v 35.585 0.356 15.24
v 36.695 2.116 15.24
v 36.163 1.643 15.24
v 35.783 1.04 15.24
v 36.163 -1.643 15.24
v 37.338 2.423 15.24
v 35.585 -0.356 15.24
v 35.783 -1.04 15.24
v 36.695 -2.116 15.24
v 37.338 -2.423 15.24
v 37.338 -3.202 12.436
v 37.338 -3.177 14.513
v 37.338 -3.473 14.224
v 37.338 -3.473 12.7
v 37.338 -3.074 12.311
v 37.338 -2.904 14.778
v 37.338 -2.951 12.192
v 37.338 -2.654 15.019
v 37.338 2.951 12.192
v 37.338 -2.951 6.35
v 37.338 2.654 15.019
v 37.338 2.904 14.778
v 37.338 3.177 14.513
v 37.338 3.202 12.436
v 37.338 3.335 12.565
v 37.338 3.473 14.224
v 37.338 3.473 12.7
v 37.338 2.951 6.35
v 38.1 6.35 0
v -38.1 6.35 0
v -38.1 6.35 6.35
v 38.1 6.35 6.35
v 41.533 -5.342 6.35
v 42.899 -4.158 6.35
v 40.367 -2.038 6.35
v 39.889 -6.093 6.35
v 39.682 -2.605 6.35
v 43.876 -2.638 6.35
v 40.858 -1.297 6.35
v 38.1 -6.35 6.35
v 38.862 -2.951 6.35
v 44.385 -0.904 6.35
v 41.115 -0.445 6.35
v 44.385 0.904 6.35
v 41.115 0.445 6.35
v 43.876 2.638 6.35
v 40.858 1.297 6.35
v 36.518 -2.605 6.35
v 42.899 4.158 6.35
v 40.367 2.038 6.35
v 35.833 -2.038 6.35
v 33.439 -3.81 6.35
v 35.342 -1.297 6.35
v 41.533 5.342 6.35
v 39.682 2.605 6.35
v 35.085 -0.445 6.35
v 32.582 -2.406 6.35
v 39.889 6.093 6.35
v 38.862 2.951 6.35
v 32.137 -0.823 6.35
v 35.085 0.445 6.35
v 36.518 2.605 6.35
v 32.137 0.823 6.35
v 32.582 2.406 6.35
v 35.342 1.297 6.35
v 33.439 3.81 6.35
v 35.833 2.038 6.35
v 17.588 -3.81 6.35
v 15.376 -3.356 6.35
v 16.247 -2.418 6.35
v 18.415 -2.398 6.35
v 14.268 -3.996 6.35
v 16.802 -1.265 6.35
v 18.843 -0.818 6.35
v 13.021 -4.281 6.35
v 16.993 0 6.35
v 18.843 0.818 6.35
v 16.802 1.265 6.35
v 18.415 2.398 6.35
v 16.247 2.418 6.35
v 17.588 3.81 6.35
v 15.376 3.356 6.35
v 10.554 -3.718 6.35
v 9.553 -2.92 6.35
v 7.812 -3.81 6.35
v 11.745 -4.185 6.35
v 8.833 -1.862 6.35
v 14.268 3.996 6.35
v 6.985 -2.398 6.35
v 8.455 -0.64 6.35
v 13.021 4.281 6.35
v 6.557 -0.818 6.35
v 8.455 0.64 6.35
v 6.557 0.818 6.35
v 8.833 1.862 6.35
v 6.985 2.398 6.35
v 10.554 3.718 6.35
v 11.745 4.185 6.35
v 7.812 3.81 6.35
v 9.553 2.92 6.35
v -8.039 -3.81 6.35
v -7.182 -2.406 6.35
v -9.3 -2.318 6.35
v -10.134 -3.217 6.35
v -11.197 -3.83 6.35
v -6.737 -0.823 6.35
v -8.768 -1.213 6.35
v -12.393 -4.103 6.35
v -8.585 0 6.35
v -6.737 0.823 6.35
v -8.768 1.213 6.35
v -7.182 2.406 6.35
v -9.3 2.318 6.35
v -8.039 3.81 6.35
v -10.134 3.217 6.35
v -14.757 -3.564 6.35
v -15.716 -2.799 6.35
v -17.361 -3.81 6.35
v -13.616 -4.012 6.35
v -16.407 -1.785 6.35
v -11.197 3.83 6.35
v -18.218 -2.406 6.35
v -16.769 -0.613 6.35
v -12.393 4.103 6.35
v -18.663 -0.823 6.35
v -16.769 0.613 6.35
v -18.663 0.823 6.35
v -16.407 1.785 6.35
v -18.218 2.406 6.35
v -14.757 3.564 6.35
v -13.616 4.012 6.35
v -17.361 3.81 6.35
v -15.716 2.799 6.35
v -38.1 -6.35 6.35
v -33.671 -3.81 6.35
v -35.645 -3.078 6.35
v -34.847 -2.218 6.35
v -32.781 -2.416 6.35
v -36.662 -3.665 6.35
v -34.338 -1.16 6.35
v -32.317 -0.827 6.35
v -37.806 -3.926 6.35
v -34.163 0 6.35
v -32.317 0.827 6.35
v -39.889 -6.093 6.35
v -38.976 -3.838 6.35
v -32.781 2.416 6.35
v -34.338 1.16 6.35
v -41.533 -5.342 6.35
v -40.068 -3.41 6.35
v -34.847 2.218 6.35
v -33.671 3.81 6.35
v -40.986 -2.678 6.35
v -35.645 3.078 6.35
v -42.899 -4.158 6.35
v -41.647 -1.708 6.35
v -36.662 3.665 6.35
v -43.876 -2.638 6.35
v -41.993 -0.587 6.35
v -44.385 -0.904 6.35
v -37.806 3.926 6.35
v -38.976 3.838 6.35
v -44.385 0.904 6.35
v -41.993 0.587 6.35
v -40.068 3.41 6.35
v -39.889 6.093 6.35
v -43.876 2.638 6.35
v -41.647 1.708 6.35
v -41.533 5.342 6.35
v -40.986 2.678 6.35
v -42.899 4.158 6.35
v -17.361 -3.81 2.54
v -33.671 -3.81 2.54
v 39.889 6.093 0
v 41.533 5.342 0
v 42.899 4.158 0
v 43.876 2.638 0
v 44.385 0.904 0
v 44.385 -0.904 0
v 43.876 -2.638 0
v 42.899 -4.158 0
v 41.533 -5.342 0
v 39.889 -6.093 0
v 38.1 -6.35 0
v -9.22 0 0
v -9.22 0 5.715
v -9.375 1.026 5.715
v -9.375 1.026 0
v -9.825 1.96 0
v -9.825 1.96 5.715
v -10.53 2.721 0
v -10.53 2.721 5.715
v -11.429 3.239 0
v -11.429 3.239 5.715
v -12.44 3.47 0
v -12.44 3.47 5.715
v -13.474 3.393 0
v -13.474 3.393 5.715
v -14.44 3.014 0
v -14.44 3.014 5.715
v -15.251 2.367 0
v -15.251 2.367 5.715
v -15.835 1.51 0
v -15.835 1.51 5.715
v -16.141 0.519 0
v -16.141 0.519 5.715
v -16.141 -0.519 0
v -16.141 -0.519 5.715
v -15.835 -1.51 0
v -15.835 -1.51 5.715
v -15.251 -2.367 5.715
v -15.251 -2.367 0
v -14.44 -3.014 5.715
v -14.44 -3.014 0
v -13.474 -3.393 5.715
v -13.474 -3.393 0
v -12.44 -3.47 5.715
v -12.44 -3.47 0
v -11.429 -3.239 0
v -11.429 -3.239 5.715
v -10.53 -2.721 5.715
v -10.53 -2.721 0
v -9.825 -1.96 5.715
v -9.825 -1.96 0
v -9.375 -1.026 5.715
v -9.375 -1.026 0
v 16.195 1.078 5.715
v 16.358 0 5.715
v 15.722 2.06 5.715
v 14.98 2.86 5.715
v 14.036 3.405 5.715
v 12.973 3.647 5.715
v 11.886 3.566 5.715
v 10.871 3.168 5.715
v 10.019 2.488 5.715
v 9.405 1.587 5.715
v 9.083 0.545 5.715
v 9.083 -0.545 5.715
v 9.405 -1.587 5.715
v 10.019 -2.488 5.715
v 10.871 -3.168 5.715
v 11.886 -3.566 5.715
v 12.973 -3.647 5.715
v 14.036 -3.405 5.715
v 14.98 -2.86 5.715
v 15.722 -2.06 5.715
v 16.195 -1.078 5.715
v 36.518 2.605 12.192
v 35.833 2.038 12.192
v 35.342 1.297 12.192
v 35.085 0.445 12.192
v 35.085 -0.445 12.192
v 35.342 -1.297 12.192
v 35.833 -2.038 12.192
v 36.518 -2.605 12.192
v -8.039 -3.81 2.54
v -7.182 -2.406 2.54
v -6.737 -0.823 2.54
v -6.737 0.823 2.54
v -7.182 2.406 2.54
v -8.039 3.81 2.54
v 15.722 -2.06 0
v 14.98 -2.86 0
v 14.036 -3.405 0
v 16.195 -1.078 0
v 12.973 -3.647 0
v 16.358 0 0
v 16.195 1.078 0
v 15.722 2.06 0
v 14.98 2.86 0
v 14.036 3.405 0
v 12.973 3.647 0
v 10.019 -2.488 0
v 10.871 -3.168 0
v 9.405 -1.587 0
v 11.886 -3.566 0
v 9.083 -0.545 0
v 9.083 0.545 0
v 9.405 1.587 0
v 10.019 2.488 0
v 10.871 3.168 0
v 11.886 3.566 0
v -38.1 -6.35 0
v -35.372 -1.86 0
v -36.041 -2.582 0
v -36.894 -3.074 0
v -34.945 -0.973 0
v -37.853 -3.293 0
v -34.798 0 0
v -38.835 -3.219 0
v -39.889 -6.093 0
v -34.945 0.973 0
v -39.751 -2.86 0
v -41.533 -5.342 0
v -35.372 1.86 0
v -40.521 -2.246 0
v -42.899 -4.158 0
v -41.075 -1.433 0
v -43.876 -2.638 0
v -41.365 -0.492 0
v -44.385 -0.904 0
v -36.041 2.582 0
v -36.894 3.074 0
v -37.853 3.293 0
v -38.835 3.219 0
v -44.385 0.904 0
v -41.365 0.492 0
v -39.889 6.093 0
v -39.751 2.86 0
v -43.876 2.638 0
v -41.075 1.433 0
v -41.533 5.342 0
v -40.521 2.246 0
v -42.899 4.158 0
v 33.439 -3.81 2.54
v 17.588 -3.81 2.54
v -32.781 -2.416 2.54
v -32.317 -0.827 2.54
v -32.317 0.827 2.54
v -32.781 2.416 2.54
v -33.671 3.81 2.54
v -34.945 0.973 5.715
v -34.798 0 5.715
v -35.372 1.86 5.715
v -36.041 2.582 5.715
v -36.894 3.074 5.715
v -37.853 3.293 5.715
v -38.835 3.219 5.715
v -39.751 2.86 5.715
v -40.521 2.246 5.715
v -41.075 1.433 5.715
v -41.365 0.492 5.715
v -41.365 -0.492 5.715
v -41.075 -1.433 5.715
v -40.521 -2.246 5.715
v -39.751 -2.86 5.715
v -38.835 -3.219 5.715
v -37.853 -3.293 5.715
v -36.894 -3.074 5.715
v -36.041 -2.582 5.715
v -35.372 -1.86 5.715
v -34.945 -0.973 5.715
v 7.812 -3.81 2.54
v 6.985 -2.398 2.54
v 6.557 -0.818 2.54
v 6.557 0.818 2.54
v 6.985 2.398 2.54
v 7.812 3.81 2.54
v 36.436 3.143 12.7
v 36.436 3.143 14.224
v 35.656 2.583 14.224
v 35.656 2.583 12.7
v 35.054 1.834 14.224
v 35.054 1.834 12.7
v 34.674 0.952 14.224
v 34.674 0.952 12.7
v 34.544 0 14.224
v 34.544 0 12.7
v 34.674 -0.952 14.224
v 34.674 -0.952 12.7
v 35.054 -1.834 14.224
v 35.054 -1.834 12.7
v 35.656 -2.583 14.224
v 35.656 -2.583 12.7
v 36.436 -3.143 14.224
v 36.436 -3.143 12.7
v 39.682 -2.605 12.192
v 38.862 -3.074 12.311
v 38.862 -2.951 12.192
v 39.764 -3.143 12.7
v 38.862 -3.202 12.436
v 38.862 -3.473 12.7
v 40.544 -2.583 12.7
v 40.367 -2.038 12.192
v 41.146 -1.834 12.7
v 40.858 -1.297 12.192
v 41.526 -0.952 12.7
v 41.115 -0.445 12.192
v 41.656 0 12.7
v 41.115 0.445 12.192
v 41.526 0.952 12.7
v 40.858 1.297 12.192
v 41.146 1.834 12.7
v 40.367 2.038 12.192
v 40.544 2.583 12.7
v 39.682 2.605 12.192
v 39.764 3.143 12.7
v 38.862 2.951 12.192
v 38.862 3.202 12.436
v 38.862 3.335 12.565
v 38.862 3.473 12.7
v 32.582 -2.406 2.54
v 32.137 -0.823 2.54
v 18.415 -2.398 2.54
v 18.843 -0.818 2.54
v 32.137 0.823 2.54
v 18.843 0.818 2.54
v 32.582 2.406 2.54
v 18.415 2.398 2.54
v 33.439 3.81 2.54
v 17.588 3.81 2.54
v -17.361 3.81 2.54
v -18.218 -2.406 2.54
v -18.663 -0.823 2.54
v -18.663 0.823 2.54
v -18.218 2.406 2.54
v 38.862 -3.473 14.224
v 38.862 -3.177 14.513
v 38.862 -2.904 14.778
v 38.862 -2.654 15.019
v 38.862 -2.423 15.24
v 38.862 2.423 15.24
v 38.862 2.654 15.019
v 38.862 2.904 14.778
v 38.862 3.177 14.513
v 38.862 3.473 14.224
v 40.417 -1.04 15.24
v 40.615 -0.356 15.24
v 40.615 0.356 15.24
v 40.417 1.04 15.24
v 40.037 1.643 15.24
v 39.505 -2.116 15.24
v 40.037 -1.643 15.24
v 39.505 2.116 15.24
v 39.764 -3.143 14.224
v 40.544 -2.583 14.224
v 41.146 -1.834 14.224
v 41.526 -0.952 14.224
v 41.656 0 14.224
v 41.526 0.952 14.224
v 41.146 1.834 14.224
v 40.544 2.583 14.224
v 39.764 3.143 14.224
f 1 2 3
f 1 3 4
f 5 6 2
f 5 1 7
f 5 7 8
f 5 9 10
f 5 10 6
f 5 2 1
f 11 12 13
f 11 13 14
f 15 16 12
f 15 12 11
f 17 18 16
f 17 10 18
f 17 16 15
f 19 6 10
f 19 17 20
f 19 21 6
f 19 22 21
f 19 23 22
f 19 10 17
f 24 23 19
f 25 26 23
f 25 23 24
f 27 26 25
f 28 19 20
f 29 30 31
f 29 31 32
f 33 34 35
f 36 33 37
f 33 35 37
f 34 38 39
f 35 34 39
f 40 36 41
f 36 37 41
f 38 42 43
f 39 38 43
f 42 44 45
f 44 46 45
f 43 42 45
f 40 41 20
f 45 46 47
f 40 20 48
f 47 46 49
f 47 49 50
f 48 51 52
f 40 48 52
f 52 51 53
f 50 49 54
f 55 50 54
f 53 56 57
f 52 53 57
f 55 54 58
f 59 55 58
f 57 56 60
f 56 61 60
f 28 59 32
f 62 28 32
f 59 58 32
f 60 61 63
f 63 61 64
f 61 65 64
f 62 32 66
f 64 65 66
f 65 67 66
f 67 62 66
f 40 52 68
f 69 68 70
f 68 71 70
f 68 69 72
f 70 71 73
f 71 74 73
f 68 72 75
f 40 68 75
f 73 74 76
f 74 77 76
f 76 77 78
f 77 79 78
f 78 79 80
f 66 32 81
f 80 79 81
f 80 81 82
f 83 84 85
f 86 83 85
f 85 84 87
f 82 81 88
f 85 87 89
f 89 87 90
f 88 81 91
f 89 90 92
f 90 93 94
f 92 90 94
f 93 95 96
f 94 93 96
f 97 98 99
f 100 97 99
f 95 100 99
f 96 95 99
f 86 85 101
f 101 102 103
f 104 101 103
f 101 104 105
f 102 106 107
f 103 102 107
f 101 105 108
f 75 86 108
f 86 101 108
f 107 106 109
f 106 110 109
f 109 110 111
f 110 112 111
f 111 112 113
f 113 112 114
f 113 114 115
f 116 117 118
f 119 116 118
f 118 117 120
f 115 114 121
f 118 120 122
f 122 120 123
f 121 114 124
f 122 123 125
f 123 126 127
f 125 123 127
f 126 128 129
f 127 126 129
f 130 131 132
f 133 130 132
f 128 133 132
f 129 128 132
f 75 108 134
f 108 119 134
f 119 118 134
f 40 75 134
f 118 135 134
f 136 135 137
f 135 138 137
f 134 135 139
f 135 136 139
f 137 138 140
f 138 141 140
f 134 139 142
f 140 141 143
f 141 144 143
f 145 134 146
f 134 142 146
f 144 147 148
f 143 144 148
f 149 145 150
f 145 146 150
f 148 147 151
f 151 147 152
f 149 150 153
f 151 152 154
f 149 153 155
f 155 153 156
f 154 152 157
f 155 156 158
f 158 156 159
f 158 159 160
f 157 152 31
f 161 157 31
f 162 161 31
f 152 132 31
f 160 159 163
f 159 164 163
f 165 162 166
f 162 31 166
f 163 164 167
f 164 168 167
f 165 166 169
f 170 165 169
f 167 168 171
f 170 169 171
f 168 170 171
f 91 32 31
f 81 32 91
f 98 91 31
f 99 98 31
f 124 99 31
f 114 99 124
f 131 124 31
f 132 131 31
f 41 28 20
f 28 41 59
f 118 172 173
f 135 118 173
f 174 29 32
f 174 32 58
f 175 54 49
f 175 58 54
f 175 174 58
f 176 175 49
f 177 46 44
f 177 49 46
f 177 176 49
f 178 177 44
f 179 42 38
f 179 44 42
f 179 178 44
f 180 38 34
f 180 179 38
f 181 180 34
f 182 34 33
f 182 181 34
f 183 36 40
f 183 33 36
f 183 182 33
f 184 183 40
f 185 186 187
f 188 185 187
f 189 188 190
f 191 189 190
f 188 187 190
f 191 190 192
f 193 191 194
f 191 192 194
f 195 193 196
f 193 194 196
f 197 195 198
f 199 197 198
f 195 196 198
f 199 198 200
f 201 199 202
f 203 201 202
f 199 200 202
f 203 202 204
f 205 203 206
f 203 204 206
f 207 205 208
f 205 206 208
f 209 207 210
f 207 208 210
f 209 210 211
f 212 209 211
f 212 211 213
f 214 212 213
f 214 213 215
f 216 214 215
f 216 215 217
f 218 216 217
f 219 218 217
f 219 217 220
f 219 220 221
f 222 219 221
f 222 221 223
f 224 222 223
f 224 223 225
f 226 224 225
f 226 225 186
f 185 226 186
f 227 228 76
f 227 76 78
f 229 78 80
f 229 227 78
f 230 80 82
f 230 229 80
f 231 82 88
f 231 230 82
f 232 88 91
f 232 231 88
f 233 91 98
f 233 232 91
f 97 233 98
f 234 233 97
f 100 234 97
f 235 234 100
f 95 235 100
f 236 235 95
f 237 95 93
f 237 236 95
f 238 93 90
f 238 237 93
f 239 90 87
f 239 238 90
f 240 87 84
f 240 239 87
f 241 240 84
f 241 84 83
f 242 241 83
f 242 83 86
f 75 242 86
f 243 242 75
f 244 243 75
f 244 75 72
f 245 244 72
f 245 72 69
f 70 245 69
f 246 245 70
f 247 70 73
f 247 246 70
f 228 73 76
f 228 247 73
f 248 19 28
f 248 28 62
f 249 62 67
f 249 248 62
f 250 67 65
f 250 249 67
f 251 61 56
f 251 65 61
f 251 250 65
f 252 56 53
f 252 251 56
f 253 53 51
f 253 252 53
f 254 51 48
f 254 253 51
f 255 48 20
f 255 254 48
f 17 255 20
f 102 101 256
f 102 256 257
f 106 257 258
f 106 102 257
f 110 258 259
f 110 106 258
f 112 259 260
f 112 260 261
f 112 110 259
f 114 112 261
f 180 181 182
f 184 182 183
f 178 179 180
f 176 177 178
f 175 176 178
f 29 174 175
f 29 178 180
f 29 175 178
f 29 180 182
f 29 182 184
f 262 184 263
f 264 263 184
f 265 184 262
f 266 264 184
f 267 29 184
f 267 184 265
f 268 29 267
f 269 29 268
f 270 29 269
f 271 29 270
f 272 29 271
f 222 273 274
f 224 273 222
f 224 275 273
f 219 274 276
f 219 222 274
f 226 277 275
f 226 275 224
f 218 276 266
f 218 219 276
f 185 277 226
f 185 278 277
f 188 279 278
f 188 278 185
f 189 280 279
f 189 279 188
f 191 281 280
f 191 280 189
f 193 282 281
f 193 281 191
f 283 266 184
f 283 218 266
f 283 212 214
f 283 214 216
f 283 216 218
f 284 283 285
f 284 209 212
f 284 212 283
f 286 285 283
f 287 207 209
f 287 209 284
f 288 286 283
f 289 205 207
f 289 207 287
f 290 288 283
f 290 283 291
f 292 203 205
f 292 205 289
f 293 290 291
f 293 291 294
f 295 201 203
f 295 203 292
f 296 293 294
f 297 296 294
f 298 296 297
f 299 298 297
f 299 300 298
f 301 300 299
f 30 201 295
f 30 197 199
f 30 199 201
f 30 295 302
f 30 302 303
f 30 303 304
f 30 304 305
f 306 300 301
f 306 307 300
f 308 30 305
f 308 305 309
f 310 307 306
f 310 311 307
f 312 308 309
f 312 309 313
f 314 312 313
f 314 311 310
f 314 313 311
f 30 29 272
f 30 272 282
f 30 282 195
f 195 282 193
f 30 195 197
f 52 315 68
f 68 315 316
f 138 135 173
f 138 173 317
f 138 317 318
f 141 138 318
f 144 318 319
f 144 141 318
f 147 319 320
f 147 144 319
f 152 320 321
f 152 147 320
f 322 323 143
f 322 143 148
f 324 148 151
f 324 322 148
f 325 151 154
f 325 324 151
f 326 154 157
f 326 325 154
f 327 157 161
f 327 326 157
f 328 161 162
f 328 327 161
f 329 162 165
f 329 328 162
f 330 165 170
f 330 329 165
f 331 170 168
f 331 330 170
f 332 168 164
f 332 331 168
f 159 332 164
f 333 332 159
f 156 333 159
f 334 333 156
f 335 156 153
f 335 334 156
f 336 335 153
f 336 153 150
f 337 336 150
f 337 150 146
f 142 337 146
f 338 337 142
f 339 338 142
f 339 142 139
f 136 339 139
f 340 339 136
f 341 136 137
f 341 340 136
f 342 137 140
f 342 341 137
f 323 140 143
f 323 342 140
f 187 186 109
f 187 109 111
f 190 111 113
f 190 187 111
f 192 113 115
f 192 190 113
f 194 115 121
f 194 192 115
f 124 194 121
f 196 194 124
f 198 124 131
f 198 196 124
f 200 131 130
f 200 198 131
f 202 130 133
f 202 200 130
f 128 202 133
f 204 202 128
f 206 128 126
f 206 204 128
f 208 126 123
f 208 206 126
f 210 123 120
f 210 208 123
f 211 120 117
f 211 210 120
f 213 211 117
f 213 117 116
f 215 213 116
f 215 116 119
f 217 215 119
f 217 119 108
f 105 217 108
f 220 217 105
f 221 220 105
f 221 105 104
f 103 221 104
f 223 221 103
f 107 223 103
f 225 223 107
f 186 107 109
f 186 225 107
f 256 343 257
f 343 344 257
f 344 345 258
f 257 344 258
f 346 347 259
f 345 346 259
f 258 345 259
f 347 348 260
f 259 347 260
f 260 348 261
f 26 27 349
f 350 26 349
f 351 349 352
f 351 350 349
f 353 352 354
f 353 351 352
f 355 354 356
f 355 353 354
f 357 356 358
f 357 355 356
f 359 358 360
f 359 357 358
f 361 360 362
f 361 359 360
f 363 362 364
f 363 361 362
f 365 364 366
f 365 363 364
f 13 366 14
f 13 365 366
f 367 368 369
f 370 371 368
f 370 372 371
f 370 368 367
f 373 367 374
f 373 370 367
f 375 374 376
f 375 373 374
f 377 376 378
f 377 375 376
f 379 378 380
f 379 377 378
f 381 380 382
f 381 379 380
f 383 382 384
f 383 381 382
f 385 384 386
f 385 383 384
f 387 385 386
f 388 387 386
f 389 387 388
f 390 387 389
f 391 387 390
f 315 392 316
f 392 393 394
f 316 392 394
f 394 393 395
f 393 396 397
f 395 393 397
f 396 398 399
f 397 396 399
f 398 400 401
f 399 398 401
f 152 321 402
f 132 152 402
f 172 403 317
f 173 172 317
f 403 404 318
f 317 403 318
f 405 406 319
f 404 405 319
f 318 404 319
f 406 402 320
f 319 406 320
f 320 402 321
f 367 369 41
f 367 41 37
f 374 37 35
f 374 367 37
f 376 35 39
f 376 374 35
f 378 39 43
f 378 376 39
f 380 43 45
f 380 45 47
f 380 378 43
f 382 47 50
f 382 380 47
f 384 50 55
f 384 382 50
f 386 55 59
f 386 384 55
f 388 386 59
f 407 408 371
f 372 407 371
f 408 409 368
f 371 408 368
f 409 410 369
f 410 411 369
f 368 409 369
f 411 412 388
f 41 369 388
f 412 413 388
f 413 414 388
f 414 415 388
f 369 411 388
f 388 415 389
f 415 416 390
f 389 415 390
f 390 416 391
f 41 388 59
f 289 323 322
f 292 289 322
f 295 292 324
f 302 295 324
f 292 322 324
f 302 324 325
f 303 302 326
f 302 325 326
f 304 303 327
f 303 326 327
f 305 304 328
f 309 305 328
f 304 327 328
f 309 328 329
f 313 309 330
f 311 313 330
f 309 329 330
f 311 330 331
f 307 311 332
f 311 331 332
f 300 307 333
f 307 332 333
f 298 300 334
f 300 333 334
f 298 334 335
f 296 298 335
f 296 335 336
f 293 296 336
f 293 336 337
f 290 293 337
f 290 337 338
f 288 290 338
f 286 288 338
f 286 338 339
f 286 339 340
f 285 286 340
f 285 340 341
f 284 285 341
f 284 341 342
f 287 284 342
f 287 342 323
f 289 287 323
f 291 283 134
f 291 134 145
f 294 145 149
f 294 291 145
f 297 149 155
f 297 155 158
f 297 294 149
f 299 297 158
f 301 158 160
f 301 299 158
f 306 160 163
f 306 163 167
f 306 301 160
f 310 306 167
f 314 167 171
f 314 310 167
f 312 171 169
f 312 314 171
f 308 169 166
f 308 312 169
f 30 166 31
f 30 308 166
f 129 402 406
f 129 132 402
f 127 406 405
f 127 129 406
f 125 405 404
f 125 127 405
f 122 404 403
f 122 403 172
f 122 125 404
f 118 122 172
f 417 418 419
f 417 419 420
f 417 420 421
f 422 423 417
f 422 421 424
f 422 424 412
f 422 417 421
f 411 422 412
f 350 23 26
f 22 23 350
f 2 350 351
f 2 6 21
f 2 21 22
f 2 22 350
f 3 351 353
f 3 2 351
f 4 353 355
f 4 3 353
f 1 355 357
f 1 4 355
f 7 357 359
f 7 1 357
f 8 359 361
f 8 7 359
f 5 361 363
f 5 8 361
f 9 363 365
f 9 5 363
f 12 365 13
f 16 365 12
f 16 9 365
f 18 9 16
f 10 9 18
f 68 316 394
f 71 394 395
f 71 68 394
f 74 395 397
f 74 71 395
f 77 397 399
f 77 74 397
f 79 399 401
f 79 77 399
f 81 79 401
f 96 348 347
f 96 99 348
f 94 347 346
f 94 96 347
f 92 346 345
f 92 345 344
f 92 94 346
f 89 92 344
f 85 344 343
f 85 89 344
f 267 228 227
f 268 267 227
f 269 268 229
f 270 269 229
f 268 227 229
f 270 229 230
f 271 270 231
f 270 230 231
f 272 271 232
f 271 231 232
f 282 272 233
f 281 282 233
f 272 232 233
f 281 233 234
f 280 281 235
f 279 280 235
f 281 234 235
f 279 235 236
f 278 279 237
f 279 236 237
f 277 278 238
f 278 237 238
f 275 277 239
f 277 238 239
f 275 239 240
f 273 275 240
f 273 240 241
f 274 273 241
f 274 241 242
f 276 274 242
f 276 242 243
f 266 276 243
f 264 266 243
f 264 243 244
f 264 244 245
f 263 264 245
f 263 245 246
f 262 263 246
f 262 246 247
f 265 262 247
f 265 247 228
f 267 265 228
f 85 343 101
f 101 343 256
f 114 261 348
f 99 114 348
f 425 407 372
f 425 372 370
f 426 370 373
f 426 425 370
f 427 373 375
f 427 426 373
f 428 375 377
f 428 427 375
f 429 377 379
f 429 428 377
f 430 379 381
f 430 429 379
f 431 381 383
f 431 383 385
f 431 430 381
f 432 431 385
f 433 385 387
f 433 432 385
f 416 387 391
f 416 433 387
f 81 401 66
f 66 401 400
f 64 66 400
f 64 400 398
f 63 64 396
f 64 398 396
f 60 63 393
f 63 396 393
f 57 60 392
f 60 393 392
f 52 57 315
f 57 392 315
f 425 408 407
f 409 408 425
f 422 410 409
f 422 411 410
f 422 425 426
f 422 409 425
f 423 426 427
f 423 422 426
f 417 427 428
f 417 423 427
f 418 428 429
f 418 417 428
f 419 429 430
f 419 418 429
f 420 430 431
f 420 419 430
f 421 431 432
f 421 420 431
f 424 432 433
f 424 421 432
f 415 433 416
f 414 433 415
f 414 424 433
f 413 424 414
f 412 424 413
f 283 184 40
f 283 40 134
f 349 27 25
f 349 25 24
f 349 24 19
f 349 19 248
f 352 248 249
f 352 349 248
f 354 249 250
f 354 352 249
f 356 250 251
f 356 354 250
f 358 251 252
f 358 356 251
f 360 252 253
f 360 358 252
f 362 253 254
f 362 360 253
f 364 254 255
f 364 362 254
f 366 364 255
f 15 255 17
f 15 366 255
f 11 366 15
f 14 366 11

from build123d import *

# Parameters (mm, degrees)
BOSS_EXTRUDE1_DEPTH = 6.35
SKETCH2_R           = 3.302
SKETCH2_R_2         = 3.4798
SKETCH2_R_3         = 3.6576
CUT_EXTRUDE1_DEPTH  = 7.35
SHELL5_T            = -2.54
SKETCH5_R           = 6.0198
BOSS_EXTRUDE5_DEPTH = 3.81
SKETCH8_W           = 1.524
SKETCH8_H           = 8.89
CUT_EXTRUDE2_DEPTH  = 6.35
CHAMFER1_SIZE       = 0.635


with BuildPart() as part:
    # Sketch1 → Boss-Extrude1 (new body)
    with BuildSketch(Plane.XY):
        with BuildLine():
            Line((-38.1, 6.35), (38.1, 6.35))
            ThreePointArc((38.1, 6.35), (44.45, 0), (38.1, -6.35))
            Line((38.1, -6.35), (-38.1, -6.35))
            ThreePointArc((-38.1, -6.35), (-44.45, 0), (-38.1, 6.35))
        make_face()
    extrude(amount=BOSS_EXTRUDE1_DEPTH)

    # Sketch2 → Cut-Extrude1 (cut, through all)
    with BuildSketch(Plane.XY.offset(6.35)):
        with Locations((-38.1, 0)):
            Circle(SKETCH2_R)
        with Locations((-12.7, 0)):
            Circle(SKETCH2_R_2)
        with Locations((12.7, 0)):
            Circle(SKETCH2_R_3)
    extrude(amount=-CUT_EXTRUDE1_DEPTH, mode=Mode.SUBTRACT)

    # Shell5
    shell5_openings = [part.faces().sort_by_distance(p)[0] for p in [
        (1.279901808, 0, 6.35),
    ]]
    offset(amount=SHELL5_T, openings=shell5_openings)

    # Sketch5 → Boss-Extrude5 (add)
    with BuildSketch(Plane.XY.offset(2.54)):
        with Locations((38.1, 0)):
            Circle(SKETCH5_R)
    extrude(amount=BOSS_EXTRUDE5_DEPTH)

    # Sketch7 → Revolve1 (revolve)
    with BuildSketch(Plane(origin=(0, 0, 0), x_dir=(1, 0, 0), z_dir=(0, 1, 0))):
        Polygon((35.052, -6.35), (35.052, -12.192), (34.544, -12.7), (34.544, -14.224), (35.56, -15.24), (38.1, -15.24), (38.1, -6.35), align=None)
    revolve(axis=Axis((38.1, 0, 0), (0, 0, 1)))

    # Sketch8 → Cut-Extrude2 (cut, symmetric)
    with BuildSketch(Plane(origin=(0, 0, 0), x_dir=(1, 0, 0), z_dir=(0, 1, 0))):
        with Locations((38.1, -10.795)):
            Rectangle(SKETCH8_W, SKETCH8_H)
    extrude(amount=CUT_EXTRUDE2_DEPTH, both=True, mode=Mode.SUBTRACT)

    # Chamfer1
    chamfer1_edges = [part.edges().sort_by_distance(p)[0] for p in [
        (-41.402, 0, 6.35),
        (-16.1798, 0, 6.35),
        (9.0424, 0, 6.35),
    ]]
    chamfer(chamfer1_edges, length=CHAMFER1_SIZE)


solid = part.part
